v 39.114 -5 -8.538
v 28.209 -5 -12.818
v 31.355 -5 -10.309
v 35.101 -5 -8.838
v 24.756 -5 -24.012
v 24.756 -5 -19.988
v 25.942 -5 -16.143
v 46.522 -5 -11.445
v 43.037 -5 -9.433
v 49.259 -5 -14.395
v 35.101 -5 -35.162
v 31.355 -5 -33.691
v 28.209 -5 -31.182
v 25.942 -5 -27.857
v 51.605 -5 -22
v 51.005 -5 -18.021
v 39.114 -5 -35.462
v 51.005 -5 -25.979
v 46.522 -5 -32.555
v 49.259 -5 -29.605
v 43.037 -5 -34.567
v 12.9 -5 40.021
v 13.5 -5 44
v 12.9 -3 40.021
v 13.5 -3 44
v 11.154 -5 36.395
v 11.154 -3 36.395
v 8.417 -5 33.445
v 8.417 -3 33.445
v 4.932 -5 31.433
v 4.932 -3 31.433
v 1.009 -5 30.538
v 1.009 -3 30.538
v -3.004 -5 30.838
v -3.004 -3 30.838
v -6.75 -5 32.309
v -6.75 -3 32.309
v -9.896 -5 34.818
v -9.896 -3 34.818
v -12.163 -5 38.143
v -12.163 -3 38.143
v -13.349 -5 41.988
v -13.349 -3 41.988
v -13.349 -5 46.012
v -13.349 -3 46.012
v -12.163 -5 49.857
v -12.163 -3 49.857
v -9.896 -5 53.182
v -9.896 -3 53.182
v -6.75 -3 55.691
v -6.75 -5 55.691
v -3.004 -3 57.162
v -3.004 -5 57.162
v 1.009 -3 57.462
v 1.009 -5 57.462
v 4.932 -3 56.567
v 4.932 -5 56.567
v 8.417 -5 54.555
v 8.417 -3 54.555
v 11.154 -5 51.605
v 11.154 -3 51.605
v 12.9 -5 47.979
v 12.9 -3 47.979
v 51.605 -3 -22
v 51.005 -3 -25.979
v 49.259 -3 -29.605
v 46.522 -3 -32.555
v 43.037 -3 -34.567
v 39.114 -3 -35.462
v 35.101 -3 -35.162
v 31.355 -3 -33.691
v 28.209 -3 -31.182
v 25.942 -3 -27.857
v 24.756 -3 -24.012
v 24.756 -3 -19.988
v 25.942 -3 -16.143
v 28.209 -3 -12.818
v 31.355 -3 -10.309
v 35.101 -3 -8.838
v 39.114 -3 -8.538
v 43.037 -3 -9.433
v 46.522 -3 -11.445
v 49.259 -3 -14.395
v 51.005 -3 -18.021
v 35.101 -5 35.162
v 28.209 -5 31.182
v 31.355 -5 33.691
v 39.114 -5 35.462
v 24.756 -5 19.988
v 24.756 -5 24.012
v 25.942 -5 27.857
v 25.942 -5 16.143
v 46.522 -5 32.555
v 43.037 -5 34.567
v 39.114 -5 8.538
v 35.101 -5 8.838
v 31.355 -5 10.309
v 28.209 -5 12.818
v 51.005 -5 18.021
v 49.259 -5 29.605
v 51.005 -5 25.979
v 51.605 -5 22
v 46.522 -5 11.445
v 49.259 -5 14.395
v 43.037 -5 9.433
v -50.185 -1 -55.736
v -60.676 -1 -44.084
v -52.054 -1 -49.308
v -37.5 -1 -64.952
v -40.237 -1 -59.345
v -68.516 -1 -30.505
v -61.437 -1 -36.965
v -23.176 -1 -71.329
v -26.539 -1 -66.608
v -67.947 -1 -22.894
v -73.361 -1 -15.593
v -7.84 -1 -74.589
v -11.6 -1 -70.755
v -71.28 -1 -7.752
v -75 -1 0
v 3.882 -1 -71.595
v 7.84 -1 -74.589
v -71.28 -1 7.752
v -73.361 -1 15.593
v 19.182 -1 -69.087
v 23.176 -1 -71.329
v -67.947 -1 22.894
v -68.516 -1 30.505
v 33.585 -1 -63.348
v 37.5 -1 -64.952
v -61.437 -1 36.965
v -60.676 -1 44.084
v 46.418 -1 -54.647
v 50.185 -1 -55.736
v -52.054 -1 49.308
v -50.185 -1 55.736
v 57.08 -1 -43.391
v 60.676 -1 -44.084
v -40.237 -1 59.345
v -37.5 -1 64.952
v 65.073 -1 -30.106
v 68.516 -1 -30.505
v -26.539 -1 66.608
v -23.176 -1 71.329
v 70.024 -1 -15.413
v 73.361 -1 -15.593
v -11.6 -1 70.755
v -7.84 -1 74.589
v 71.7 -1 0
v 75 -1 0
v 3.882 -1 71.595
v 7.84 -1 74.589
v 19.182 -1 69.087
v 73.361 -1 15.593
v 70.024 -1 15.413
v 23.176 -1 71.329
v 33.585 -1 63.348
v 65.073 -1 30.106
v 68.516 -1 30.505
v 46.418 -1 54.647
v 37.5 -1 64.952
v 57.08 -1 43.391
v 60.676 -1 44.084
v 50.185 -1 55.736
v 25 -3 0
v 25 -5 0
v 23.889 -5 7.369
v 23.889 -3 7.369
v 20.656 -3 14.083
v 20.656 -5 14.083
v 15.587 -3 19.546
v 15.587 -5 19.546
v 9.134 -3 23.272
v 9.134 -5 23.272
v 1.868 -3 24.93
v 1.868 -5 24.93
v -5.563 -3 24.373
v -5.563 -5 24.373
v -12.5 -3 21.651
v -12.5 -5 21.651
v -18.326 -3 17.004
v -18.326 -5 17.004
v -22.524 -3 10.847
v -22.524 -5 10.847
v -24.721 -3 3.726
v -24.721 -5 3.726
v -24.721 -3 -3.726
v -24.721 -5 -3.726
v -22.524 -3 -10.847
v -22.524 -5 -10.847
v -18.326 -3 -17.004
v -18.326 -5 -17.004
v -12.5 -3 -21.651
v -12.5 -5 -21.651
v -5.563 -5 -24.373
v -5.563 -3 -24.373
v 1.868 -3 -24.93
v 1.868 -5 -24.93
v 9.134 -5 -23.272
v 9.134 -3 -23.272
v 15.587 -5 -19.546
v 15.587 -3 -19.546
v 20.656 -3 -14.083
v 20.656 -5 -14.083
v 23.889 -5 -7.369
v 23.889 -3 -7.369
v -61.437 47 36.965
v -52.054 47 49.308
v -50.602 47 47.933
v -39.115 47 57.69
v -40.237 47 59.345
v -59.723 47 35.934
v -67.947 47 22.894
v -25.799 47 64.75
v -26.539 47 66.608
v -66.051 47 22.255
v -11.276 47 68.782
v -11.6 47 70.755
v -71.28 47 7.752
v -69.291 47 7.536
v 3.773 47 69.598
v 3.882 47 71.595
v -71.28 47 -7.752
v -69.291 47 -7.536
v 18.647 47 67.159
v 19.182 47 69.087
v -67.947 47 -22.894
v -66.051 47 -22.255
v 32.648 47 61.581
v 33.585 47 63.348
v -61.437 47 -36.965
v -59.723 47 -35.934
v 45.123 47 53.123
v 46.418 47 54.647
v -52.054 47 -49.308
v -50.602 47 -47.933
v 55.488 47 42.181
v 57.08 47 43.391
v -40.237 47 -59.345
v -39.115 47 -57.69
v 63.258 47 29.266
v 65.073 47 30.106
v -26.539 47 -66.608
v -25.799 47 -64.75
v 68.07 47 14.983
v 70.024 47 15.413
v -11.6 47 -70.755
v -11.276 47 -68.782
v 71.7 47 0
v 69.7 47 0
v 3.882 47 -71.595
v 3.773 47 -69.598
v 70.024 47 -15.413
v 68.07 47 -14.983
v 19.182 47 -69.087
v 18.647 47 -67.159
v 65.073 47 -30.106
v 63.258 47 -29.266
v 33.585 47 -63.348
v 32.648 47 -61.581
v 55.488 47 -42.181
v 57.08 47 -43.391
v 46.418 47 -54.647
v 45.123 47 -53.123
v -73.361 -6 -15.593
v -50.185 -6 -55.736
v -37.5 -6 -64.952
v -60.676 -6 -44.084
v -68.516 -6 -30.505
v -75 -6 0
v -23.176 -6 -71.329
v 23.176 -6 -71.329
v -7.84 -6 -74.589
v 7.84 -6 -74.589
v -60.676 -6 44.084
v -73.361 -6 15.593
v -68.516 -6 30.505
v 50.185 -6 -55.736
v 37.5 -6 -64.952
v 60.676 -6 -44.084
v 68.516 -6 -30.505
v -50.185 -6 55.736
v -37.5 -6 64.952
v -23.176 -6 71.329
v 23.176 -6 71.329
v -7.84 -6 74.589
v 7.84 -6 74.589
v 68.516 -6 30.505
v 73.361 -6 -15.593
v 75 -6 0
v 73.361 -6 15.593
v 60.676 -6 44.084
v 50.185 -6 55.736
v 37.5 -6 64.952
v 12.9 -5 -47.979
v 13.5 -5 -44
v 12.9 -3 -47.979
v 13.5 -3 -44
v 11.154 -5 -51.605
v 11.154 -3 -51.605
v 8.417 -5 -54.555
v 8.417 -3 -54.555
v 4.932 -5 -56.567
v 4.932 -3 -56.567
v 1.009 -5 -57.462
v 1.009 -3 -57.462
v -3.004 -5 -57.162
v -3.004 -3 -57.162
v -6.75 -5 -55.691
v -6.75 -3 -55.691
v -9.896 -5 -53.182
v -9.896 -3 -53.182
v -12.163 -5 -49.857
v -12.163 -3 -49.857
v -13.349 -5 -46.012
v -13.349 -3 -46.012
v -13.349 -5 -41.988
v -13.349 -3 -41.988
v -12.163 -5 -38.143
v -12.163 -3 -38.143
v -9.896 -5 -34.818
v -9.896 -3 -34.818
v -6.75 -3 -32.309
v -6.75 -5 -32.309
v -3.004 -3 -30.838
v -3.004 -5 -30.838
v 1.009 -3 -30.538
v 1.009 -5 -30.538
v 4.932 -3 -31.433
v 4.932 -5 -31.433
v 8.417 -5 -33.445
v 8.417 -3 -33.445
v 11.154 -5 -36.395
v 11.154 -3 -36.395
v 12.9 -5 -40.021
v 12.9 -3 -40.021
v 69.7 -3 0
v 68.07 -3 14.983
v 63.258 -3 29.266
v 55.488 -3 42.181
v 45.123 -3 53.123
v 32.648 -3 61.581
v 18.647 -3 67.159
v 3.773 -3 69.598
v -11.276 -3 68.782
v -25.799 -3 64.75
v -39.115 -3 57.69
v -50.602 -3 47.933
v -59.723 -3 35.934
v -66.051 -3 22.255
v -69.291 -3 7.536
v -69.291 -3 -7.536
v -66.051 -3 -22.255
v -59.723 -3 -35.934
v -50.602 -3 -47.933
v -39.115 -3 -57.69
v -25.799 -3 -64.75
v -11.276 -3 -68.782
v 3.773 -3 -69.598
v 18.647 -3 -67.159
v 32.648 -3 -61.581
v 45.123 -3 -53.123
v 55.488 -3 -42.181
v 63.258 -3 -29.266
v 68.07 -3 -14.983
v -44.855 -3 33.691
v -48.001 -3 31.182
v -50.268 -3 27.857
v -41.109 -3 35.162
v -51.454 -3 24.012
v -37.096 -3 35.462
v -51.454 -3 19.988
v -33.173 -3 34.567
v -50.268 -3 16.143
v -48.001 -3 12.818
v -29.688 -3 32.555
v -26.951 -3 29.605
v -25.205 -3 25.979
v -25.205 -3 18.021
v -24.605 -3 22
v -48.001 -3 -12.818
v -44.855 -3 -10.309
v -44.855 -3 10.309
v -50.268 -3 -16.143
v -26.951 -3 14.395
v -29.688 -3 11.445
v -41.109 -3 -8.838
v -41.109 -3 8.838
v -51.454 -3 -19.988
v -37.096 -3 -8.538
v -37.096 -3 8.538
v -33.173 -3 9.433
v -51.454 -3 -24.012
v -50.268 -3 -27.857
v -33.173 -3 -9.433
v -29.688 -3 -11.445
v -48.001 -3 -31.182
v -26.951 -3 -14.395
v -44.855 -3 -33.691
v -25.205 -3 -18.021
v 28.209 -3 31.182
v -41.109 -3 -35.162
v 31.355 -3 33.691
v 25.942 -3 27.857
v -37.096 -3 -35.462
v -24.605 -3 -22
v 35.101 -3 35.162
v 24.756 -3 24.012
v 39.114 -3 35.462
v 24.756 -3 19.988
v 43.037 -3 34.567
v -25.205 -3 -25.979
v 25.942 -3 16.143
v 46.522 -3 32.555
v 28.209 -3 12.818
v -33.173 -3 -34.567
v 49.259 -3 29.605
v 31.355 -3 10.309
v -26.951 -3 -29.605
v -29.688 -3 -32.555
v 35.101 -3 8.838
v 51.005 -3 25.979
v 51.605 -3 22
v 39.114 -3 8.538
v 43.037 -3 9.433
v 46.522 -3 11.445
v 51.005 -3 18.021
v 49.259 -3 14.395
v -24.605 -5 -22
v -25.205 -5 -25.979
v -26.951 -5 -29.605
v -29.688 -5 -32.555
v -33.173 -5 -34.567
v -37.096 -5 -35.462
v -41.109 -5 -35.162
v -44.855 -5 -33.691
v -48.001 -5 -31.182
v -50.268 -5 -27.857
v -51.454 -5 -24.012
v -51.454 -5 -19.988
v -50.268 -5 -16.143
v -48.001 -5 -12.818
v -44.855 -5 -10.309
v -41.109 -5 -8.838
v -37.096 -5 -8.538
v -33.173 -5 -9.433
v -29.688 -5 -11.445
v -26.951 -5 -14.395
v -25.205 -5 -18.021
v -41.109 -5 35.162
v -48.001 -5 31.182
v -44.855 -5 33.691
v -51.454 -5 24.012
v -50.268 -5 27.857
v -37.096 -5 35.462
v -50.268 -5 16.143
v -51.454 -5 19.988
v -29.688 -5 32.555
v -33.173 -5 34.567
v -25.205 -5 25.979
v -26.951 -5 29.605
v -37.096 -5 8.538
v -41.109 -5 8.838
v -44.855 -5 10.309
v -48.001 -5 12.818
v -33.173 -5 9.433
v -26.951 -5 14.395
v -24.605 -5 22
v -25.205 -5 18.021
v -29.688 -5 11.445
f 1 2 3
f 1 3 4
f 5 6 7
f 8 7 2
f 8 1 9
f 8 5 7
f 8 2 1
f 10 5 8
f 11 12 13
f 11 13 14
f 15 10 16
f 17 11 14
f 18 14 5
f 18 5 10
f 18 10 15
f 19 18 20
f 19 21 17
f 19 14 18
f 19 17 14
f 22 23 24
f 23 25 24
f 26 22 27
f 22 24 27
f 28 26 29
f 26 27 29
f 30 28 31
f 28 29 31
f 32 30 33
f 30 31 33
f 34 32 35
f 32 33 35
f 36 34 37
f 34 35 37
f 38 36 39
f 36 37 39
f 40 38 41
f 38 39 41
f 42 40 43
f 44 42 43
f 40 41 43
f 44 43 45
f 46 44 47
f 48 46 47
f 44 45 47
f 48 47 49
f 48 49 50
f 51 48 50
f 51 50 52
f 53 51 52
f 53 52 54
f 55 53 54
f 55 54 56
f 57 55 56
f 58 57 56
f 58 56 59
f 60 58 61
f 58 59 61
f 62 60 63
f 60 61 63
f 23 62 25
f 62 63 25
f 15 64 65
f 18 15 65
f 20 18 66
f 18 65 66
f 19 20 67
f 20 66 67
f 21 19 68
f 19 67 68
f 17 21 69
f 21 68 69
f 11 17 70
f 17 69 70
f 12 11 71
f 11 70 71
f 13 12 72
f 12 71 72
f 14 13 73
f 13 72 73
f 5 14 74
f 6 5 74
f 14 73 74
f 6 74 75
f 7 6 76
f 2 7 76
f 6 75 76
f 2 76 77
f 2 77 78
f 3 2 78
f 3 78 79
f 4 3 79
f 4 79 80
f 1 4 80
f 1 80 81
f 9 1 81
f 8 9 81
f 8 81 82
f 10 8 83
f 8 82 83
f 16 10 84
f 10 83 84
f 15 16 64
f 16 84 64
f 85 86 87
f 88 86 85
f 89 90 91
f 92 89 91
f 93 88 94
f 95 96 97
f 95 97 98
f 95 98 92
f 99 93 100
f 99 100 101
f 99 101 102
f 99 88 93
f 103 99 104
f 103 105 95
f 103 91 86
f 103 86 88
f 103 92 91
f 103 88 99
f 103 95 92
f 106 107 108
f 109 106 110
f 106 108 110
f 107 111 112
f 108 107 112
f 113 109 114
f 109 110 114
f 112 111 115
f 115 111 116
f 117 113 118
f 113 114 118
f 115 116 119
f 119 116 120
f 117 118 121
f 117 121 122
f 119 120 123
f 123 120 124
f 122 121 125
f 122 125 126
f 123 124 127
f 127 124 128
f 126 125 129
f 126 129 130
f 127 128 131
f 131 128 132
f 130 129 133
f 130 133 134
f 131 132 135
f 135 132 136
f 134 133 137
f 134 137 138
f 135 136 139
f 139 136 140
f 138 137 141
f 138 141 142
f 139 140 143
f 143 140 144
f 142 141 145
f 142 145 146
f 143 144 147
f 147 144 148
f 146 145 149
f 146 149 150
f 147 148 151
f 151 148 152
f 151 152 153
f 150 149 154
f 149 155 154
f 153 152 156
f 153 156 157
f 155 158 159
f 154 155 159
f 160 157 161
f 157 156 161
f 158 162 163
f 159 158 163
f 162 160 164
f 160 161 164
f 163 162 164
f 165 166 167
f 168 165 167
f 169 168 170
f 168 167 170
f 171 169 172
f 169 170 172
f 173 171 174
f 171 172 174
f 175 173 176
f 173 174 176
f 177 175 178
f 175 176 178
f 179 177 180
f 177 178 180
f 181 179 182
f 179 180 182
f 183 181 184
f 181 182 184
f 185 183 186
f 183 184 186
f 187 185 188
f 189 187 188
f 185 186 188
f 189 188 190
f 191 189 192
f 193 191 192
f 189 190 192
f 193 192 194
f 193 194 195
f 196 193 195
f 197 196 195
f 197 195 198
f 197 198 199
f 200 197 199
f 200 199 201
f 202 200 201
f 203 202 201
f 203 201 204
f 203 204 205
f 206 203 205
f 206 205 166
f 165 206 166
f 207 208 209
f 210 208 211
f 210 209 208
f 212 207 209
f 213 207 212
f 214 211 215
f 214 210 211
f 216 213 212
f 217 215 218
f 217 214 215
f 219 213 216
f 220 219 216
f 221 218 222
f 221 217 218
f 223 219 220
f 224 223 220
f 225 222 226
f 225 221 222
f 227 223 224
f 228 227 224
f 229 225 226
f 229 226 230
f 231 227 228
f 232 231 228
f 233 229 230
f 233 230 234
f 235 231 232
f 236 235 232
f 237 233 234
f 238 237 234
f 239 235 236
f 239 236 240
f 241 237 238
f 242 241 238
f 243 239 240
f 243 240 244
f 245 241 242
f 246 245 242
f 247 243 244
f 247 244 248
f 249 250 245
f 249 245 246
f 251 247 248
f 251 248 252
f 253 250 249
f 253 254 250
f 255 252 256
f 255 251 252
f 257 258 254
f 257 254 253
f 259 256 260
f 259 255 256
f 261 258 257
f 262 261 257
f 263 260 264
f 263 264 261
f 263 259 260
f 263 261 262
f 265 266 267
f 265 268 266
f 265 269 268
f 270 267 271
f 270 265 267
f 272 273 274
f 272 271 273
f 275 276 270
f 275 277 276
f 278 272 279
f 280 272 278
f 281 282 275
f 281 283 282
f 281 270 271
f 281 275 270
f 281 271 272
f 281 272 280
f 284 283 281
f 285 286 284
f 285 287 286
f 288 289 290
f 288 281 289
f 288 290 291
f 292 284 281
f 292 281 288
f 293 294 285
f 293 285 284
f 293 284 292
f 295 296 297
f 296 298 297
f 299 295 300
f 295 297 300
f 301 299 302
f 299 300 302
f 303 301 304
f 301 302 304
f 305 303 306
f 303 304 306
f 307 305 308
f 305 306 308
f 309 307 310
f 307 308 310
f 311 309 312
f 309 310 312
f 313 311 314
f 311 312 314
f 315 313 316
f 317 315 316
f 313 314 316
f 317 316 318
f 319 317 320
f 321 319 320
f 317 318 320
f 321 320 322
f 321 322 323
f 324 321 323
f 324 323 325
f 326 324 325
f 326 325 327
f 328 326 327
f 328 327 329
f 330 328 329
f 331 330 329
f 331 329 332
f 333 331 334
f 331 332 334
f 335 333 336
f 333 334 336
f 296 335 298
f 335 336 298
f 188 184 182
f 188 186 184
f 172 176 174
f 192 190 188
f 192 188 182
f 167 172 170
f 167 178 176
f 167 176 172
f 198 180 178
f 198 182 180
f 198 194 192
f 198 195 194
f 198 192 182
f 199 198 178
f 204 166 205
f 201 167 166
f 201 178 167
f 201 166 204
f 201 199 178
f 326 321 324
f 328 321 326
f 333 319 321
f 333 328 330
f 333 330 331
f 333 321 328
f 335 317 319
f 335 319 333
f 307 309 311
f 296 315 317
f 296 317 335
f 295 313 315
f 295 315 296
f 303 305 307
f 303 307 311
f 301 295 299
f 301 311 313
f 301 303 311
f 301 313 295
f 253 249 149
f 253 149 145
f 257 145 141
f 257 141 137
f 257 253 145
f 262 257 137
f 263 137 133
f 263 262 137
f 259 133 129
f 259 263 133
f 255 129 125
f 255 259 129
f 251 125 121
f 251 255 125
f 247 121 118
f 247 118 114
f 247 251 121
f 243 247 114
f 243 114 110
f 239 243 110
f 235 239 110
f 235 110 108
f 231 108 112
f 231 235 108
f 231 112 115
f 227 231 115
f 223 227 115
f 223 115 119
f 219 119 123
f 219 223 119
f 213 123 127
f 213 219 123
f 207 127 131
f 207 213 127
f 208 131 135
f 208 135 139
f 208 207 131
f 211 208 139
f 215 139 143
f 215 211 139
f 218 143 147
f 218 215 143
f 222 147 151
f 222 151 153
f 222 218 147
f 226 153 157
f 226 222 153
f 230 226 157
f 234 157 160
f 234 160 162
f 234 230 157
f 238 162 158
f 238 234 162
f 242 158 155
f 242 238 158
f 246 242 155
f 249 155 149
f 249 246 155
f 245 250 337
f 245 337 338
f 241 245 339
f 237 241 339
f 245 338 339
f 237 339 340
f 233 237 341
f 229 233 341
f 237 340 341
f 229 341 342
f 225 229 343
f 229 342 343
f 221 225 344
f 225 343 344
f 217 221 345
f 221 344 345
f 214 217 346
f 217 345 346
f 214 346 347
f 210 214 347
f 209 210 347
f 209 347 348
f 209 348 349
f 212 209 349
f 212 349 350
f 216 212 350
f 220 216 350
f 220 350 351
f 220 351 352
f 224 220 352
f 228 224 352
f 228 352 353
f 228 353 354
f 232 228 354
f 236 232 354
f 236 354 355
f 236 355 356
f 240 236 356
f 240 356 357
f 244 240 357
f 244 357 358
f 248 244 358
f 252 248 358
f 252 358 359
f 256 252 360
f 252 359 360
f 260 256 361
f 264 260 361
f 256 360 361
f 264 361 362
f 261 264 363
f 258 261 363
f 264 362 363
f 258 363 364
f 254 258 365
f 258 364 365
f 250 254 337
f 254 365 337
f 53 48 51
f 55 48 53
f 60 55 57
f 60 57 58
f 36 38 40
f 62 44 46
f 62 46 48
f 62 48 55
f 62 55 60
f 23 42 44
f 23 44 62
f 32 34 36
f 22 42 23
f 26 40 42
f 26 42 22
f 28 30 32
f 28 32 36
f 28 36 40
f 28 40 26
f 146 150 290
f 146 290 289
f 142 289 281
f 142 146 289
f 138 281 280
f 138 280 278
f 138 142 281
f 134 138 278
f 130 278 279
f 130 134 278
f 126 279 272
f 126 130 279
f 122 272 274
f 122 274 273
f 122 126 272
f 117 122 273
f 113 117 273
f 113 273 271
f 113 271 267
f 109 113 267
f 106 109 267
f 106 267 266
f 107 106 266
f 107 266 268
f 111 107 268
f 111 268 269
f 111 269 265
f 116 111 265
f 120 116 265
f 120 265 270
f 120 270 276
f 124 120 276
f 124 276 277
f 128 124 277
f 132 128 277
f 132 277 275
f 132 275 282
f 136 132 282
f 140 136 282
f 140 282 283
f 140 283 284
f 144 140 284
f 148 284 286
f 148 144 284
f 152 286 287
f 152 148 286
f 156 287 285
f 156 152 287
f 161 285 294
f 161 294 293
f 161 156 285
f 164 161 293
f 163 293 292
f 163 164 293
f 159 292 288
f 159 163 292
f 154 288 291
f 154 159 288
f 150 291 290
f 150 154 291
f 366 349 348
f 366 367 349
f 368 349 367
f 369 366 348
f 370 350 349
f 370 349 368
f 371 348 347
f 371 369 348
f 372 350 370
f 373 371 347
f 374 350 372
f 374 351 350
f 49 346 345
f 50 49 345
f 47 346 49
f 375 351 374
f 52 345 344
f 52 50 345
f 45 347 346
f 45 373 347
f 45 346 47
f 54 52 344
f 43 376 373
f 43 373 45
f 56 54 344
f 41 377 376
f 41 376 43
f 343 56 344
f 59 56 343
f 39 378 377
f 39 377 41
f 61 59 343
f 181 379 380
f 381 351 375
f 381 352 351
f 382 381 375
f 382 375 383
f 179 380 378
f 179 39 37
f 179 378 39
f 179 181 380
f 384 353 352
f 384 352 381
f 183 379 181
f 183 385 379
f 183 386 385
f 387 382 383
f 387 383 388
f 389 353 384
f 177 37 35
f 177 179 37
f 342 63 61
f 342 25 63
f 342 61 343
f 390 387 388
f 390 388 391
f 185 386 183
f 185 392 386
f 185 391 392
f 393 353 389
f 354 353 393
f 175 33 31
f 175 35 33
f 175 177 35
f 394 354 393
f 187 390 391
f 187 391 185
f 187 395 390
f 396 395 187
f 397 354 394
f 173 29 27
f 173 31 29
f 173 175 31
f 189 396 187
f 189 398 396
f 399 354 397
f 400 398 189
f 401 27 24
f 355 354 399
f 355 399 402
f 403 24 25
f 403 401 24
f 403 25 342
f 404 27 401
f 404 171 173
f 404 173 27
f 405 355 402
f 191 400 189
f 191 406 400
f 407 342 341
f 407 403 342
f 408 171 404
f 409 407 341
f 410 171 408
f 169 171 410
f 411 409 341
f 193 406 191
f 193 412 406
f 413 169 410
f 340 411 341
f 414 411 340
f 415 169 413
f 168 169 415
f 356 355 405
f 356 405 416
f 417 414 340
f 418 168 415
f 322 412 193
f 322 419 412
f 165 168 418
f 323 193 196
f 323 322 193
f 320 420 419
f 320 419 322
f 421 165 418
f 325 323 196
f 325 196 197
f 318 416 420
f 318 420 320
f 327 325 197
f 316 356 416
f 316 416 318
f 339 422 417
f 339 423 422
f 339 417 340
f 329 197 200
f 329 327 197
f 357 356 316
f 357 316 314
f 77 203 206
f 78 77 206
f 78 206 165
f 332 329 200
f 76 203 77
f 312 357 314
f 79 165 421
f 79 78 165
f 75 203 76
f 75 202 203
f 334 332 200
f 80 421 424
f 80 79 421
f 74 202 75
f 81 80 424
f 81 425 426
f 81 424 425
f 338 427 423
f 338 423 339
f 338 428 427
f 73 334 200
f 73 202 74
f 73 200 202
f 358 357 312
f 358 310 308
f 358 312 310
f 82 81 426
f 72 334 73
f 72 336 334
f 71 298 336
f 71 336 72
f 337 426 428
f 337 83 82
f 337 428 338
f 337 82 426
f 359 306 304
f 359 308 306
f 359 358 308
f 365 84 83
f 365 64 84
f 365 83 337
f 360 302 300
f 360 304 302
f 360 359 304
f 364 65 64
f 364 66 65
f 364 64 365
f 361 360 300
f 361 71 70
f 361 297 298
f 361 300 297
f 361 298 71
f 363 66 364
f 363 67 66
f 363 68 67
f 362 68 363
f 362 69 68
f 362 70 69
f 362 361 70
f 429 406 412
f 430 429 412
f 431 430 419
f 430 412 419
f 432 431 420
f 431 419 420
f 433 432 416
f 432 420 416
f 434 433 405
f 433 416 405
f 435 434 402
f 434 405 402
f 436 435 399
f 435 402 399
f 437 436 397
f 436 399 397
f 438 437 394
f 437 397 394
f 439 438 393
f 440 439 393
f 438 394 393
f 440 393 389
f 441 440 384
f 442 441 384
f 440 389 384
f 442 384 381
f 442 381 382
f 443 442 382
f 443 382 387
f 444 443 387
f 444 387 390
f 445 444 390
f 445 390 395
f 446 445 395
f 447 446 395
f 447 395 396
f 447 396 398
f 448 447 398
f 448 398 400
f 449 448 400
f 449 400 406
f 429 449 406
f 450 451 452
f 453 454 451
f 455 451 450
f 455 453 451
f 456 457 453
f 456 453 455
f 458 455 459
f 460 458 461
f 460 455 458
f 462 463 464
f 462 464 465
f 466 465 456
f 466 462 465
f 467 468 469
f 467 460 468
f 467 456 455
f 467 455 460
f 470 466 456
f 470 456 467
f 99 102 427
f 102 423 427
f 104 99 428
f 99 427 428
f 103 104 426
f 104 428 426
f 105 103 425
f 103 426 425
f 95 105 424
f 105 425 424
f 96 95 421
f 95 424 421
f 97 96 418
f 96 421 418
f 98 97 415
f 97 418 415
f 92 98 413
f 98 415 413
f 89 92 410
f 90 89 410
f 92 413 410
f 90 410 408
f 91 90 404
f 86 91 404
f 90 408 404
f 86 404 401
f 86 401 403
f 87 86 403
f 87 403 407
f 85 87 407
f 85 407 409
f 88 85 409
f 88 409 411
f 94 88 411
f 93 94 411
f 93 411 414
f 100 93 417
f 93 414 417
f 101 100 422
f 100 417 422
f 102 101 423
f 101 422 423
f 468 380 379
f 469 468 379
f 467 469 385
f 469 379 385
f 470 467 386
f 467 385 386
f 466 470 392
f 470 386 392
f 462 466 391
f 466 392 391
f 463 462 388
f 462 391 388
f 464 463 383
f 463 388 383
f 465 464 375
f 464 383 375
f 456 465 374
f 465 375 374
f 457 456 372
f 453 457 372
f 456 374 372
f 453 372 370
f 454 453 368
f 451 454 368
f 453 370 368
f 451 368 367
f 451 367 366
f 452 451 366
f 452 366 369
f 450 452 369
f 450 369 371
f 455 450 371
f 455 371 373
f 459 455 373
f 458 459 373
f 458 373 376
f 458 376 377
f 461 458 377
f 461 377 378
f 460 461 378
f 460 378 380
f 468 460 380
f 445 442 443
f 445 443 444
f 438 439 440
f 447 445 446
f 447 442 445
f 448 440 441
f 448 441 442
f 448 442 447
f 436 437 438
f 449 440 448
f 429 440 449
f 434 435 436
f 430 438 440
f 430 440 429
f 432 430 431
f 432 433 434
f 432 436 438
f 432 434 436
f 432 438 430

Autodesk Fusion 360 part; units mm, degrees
sketch "Skizze1" plane through (0, 0, 0) normal (0, 1, 0) x (1, 0, 0)
  circle A0 centre (0, 0) radius 71.7
  circle A1 centre (0, 0) radius 68.7
  circle A2 centre (0, 0) radius 25
  circle A3 centre (0, 44) radius 13.5
  circle A4 centre (-38.1051, 22) radius 13.5
  circle A5 centre (-38.1051, -22) radius 13.5
  circle A6 centre (0, -44) radius 13.5
  circle A7 centre (38.1051, -22) radius 13.5
  circle A8 centre (38.1051, 22) radius 13.5
  dimension "d2" = 143.4
  dimension "d3" = 3
  dimension "d4" = 50
  dimension "d11" = 27
  dimension "d13" = 360
  dimension "d17" = 44
  dimension "d25" = 44
extrude "Extrusion1" add sketch "Skizze1" along normal blind 2 contours A1 | A3 | A4 | A5 | A6 | A7 | A8 makes body 1
extrude "Extrusion2" add sketch "Skizze1" against normal blind 1 contours A0 | A1 | A2 | A3 | A4 | A5 | A6 | A7 | A8 bodies 1
extrude "Extrusion3" add sketch "Skizze1" along normal blind 60 contours A0 bodies 1
extrude "Extrusion4" cut sketch "Skizze1" against normal blind 2 from surface at 2 contours A3 | A4 | A5 | A6 | A7 | A8 bodies 1
sketch "Skizze2" plane through (0, 60, 0) normal (0, 1, 0) x (-1, 0, 0)
  circle A0 centre (0, 0) radius 68.7
  circle A1 centre (0, 0) radius 71.7
  circle A2 centre (0, 0) radius 68.3
  circle A3 centre (0, 0) radius 63.7
  dimension "d19" = -0.4
  dimension "d22" = -5
extrude "Extrusion5" add sketch "Skizze2" along normal blind 4 separate body contours A0 | A1 | A2 | A3 makes body 2
extrude "Extrusion6" add sketch "Skizze2" against normal blind 5 contours A2 bodies 2
sketch "Skizze3" plane through (0, -1, 0) normal (0, -1, 0) x (1, 0, 0)
  circle A0 centre (0, 0) radius 71.7
  circle A1 centre (0, 0) radius 75
  dimension "d26" = 150
extrude "Extrusion7" add sketch "Skizze3" along normal blind 5 contours A0 | A1 bodies 1
extrude "Extrusion8" cut 7 faces at (36.4978, 0, -25.6989) (3.6941, 0, -49.6839) (-6.7759, 0, 1.242) (-46.8549, 0, -23.9971) (-34.6344, 0, 25.418) (-1.9803, 0, 52.6763) (42.9135, 0, 25.5182) along direction (0, -1, 0) blind 5 on bodies 1 bodies 1
extrude "Extrusion9" cut 1 faces at (26.9574, 2, -46.6916) along direction (0, -1, 0) blind 5 on bodies 1 bodies 1
move_face "Flächen versetzen1" offset -1 1 faces at (68.6146, 39, 3.4244) on bodies 1
extrude "Extrusion10" cut 1 faces at (-22.538, 60, -67.176) along direction (0, -1, 0) blind 13 on bodies 1 bodies 1
hidden bodies 2
equation "Durchmesser = Plexidurchmesser - 3 mm - 3 mm - 0.6 mm"
equation "d2 = Durchmesser"
equation "Plexidurchmesser = 150 mm"
